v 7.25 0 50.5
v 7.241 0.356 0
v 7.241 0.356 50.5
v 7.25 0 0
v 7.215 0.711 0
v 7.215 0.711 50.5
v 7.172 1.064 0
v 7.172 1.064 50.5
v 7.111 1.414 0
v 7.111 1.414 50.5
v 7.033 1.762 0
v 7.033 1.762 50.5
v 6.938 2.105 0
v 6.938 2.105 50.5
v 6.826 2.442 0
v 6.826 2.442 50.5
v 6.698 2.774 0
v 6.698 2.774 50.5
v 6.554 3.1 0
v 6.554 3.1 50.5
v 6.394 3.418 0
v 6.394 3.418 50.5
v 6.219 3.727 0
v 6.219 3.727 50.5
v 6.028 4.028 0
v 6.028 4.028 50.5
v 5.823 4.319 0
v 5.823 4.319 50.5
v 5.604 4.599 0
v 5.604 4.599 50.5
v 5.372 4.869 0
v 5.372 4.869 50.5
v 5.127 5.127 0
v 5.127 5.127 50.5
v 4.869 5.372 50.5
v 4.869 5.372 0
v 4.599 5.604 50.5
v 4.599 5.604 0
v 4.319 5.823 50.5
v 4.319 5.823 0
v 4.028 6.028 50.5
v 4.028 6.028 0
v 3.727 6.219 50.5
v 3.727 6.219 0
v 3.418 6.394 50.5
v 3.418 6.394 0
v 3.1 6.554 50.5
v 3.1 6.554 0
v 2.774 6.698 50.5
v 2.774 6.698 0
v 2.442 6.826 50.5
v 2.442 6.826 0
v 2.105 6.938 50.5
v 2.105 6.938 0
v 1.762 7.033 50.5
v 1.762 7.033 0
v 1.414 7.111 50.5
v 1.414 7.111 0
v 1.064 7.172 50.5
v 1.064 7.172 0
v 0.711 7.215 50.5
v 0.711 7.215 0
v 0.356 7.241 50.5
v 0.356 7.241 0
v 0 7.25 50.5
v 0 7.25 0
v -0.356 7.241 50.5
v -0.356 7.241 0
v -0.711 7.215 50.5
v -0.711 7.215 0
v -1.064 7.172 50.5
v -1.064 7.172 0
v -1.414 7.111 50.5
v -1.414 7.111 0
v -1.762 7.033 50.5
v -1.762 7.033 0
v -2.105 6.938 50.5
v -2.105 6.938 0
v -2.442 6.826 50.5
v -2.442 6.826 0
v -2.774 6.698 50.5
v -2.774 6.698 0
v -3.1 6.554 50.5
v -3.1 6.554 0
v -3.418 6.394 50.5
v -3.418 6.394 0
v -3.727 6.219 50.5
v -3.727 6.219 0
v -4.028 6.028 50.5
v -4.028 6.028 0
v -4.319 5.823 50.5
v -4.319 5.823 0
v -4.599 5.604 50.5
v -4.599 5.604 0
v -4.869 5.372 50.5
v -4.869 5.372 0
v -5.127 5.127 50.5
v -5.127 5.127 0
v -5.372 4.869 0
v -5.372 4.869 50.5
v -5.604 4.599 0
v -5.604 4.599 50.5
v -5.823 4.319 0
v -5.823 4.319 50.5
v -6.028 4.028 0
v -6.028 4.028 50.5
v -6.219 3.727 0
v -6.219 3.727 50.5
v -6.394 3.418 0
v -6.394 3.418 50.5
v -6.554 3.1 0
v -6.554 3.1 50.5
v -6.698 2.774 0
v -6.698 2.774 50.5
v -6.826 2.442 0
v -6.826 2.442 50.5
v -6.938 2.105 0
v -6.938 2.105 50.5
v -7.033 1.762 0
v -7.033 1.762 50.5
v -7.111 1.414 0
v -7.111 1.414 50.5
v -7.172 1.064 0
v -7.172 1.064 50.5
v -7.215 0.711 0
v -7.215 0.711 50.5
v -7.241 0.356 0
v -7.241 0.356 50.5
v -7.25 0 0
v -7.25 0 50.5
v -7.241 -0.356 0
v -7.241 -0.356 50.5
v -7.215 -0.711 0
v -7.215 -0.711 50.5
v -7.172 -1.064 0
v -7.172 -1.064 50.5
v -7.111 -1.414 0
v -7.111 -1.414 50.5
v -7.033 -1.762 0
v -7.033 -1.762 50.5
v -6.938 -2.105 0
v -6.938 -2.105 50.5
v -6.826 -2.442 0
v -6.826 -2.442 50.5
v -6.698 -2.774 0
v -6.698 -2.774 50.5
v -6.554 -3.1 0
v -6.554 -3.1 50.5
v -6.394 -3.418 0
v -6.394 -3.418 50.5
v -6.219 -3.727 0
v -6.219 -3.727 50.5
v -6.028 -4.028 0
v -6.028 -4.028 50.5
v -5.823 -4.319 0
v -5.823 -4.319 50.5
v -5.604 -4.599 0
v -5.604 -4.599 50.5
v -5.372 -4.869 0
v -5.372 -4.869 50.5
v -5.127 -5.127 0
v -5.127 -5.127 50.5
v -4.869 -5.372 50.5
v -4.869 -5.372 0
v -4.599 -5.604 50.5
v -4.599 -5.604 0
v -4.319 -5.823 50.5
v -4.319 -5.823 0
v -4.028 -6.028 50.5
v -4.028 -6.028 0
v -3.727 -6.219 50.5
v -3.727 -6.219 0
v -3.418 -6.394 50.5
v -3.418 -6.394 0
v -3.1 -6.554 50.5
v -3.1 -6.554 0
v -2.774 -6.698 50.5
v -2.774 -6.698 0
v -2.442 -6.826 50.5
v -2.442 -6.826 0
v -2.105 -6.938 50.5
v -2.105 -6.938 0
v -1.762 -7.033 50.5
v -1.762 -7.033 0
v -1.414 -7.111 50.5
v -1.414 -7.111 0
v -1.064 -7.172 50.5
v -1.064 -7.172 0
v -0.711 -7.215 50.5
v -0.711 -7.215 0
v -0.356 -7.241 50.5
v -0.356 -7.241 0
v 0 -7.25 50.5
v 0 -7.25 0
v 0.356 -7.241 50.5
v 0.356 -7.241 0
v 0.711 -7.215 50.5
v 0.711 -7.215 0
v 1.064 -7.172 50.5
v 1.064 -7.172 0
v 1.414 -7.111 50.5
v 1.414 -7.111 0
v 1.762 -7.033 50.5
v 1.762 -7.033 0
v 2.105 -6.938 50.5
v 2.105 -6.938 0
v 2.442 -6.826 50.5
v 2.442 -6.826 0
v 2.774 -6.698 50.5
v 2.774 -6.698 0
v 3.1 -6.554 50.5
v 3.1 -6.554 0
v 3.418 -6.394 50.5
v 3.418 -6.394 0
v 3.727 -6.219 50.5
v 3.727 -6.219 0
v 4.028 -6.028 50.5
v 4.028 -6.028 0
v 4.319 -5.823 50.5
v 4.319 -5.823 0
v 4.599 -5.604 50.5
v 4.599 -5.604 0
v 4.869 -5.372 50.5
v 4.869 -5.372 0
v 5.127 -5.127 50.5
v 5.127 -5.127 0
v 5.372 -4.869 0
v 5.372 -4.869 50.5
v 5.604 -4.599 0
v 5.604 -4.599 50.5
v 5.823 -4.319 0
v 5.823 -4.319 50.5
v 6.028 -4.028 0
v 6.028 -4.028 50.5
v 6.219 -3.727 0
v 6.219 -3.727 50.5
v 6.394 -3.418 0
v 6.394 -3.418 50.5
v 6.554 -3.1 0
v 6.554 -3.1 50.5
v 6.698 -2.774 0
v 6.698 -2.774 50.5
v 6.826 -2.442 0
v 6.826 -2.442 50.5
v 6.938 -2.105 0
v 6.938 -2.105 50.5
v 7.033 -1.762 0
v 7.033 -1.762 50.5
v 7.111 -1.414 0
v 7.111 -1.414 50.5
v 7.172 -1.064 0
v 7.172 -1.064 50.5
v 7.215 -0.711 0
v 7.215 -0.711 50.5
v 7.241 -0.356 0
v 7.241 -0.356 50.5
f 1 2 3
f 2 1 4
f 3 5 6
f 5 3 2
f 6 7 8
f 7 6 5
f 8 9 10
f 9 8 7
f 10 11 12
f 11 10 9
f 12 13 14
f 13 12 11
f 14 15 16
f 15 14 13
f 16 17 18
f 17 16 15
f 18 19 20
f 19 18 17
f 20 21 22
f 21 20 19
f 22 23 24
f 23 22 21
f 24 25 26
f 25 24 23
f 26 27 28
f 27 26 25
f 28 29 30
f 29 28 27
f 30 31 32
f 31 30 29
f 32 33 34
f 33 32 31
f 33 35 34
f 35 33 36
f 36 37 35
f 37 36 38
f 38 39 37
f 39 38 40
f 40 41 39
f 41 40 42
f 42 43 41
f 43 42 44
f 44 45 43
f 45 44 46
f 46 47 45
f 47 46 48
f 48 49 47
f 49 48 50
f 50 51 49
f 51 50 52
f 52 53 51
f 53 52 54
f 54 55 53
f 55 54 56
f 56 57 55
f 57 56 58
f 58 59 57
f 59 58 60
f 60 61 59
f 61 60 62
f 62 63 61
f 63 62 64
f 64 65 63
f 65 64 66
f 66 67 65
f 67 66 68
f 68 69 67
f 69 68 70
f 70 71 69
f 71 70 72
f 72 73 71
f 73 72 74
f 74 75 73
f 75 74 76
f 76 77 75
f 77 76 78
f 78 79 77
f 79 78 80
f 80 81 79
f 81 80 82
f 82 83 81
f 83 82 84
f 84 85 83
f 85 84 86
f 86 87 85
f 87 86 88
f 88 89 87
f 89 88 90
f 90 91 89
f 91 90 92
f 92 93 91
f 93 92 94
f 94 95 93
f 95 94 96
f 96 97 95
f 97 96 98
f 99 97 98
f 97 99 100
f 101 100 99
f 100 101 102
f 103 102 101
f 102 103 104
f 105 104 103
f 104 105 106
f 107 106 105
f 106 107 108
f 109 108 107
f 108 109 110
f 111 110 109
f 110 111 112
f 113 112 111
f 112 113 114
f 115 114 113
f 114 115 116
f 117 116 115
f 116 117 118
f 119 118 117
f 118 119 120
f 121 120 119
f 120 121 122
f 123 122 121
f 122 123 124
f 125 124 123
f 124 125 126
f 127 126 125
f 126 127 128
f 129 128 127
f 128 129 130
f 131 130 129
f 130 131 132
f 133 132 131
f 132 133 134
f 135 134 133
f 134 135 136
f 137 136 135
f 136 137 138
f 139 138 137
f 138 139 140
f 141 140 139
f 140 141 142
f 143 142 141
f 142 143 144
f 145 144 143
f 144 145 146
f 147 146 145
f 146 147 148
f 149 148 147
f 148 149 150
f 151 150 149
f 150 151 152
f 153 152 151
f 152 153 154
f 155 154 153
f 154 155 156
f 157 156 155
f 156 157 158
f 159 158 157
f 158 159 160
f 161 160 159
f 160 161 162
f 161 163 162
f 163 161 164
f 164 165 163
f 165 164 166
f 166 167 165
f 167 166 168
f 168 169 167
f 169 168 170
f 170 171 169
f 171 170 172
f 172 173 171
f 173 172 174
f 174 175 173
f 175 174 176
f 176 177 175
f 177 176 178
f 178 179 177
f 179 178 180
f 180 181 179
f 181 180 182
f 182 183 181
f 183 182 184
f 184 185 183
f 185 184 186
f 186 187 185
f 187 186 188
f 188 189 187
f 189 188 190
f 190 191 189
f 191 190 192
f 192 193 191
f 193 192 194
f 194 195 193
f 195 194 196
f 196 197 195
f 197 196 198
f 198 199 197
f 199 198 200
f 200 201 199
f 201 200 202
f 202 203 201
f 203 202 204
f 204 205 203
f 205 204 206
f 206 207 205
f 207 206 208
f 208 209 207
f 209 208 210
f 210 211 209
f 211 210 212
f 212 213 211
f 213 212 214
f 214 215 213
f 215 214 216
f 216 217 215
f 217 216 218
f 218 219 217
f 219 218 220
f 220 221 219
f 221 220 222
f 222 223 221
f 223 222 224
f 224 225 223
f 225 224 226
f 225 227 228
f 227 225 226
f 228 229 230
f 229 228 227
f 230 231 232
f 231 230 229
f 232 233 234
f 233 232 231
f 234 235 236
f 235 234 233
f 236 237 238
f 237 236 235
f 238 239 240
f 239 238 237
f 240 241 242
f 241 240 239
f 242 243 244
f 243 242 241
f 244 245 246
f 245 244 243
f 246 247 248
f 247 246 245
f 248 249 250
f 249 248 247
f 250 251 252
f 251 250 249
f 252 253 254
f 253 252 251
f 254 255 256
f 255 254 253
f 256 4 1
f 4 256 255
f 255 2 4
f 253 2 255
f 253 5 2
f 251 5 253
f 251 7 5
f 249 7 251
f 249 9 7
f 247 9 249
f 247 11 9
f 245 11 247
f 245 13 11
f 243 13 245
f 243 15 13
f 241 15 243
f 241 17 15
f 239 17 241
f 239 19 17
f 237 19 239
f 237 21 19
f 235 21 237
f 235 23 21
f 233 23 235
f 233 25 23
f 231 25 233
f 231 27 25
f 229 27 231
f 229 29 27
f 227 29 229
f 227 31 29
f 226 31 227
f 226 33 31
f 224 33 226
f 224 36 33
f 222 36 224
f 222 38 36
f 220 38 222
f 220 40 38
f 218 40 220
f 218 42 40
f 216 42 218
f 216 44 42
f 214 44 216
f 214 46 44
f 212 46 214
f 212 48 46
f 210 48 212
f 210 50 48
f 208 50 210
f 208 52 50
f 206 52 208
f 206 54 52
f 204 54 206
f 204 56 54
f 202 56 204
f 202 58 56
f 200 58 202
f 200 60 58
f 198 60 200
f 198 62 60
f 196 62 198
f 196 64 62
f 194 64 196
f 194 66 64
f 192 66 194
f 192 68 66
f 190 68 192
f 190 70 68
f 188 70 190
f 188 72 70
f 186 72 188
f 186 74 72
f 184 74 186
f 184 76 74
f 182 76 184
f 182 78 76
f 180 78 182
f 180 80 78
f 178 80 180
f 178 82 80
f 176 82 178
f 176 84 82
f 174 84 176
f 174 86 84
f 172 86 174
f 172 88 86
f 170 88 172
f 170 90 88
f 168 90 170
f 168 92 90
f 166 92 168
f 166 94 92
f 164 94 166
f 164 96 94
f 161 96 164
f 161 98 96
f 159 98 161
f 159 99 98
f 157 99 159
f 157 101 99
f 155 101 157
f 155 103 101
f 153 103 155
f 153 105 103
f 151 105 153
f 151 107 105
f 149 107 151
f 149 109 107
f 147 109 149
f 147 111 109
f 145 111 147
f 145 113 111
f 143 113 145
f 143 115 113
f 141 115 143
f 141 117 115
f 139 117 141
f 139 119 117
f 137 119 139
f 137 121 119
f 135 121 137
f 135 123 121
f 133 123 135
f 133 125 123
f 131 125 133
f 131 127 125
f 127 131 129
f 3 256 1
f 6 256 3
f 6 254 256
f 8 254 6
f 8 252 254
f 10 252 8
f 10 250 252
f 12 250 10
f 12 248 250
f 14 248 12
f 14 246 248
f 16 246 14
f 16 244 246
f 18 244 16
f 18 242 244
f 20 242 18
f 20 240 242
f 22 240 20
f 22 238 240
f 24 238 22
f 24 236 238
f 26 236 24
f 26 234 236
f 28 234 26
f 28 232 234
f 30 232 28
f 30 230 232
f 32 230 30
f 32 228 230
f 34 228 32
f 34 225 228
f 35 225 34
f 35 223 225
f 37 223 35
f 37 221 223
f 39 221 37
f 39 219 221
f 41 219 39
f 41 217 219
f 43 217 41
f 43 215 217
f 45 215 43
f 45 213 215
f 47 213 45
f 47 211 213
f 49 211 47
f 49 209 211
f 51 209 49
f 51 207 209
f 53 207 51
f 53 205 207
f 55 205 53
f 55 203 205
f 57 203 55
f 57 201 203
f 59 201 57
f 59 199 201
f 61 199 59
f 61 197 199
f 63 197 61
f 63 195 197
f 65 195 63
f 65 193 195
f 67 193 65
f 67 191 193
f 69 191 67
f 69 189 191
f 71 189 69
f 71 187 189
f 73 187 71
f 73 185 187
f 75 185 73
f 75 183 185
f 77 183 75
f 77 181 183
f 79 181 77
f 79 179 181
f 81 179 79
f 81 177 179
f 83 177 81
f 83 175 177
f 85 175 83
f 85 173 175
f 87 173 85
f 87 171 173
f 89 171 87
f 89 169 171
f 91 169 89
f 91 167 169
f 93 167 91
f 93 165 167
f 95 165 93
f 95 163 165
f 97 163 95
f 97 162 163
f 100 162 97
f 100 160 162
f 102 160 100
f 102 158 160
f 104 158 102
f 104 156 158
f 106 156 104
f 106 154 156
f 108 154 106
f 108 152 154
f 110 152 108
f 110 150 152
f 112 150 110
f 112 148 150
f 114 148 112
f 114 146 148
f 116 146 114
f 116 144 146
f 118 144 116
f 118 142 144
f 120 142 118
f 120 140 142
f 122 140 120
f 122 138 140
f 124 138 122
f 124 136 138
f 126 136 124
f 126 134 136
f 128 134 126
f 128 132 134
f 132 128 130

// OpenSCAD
$fn = 128;

height = 50.5;      // mm
diameter = 14.5;    // mm

cylinder(h = height, d = diameter);
